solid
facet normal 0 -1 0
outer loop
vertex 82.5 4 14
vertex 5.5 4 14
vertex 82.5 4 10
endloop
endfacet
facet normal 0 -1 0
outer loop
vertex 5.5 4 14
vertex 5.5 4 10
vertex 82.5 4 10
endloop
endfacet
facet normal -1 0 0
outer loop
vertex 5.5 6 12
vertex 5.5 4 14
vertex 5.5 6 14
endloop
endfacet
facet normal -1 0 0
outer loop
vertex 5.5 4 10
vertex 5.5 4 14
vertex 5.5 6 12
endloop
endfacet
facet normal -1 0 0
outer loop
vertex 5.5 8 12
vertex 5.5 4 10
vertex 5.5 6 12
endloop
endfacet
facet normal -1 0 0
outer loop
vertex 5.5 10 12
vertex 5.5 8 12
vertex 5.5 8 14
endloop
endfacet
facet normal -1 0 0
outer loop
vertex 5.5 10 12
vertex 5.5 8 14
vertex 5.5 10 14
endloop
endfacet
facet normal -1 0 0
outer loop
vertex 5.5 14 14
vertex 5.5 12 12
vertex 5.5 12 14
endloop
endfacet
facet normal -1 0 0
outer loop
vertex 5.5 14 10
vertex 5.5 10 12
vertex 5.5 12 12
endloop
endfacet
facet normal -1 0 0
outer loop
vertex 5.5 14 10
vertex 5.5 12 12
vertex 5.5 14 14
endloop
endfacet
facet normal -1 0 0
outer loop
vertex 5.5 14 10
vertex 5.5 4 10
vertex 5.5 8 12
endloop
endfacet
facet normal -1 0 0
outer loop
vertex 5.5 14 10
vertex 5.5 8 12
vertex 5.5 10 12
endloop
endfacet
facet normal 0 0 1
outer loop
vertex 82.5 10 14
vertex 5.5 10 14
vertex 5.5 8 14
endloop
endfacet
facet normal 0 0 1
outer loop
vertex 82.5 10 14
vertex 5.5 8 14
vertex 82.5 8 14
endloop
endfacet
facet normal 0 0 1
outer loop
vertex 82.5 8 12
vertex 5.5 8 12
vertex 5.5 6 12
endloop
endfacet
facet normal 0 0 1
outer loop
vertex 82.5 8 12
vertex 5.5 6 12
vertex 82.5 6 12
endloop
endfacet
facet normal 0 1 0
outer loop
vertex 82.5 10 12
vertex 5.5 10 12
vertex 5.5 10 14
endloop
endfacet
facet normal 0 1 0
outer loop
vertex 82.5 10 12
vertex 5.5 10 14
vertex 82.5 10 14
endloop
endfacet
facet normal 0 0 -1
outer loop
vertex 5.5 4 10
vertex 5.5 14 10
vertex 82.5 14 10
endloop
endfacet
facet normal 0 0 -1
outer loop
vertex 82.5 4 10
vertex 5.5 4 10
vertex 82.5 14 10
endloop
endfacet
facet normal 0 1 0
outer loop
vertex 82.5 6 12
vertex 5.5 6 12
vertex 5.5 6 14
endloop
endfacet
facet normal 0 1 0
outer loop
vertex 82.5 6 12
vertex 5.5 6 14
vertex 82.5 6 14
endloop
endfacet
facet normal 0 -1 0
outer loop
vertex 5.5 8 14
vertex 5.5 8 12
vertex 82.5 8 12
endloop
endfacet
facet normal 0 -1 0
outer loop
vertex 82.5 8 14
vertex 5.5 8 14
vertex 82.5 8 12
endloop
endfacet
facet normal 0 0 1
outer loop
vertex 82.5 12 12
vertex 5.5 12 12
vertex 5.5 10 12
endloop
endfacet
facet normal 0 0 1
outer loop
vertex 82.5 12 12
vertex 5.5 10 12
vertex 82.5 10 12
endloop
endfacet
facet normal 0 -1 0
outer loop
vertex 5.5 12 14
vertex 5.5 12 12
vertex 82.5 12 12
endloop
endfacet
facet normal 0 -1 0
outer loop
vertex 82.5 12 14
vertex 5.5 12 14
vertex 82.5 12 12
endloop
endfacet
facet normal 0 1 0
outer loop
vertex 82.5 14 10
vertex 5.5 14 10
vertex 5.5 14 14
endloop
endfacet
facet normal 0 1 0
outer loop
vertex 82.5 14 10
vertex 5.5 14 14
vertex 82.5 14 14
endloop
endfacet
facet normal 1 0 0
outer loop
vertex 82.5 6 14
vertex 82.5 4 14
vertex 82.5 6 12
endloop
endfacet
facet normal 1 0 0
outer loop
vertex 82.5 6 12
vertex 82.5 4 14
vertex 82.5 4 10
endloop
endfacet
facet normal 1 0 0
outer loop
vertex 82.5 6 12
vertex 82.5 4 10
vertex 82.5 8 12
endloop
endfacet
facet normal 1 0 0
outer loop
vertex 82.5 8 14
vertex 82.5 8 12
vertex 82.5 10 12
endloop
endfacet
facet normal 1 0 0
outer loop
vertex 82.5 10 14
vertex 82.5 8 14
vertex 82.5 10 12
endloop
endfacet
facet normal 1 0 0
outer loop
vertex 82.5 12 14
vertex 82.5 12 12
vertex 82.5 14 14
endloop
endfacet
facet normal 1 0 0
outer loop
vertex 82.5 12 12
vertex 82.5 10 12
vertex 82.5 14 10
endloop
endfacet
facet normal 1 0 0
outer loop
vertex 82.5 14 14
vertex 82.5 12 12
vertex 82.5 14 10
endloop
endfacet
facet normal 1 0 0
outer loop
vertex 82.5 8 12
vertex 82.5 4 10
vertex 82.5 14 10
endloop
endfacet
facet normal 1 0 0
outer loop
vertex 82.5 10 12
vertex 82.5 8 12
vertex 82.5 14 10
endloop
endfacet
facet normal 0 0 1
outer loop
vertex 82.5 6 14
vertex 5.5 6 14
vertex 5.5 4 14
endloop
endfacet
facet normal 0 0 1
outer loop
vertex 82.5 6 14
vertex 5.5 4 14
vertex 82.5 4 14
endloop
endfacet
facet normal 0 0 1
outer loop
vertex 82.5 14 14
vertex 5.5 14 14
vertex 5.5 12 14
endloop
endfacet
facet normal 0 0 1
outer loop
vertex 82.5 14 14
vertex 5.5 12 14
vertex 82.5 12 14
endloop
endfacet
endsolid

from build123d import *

# Parameters (mm, degrees)
BOX010_W     = 77
BOX010_H     = 2
BOX010_DEPTH = 2
BOX011_W     = 77
BOX011_H     = 2
BOX011_DEPTH = 2
BOX009_W     = 77
BOX009_H     = 2
BOX009_DEPTH = 2
BOX008_W     = 77
BOX008_H     = 10
BOX008_DEPTH = 2


with BuildPart() as cube010:
    # Box010 → Box010 (new body)
    with BuildSketch(Plane(origin=(5.5, 104, 12), x_dir=(1, 0, 0), z_dir=(0, 0, 1))):
        with Locations((38.5, 1)):
            Rectangle(BOX010_W, BOX010_H)
    extrude(amount=BOX010_DEPTH)


with BuildPart() as cube011:
    # Box011 → Box011 (new body)
    with BuildSketch(Plane(origin=(5.5, 108, 12), x_dir=(1, 0, 0), z_dir=(0, 0, 1))):
        with Locations((38.5, 1)):
            Rectangle(BOX011_W, BOX011_H)
    extrude(amount=BOX011_DEPTH)


with BuildPart() as cube009:
    # Box009 → Box009 (new body)
    with BuildSketch(Plane(origin=(5.5, 112, 12), x_dir=(1, 0, 0), z_dir=(0, 0, 1))):
        with Locations((38.5, 1)):
            Rectangle(BOX009_W, BOX009_H)
    extrude(amount=BOX009_DEPTH)


with BuildPart() as fusion:
    # Box008 → Box008 (new body)
    with BuildSketch(Plane(origin=(5.5, 104, 10), x_dir=(1, 0, 0), z_dir=(0, 0, 1))):
        with Locations((38.5, 5)):
            Rectangle(BOX008_W, BOX008_H)
    extrude(amount=BOX008_DEPTH)

    # Fusion: union Cube010, Cube011, Cube009
    add(cube010.part)
    add(cube011.part)
    add(cube009.part)


with BuildPart() as fusion_1:
    # Fusion placement: moved
    add(fusion.part.moved(Location((0, -100, 0))))


solid = fusion_1.part
